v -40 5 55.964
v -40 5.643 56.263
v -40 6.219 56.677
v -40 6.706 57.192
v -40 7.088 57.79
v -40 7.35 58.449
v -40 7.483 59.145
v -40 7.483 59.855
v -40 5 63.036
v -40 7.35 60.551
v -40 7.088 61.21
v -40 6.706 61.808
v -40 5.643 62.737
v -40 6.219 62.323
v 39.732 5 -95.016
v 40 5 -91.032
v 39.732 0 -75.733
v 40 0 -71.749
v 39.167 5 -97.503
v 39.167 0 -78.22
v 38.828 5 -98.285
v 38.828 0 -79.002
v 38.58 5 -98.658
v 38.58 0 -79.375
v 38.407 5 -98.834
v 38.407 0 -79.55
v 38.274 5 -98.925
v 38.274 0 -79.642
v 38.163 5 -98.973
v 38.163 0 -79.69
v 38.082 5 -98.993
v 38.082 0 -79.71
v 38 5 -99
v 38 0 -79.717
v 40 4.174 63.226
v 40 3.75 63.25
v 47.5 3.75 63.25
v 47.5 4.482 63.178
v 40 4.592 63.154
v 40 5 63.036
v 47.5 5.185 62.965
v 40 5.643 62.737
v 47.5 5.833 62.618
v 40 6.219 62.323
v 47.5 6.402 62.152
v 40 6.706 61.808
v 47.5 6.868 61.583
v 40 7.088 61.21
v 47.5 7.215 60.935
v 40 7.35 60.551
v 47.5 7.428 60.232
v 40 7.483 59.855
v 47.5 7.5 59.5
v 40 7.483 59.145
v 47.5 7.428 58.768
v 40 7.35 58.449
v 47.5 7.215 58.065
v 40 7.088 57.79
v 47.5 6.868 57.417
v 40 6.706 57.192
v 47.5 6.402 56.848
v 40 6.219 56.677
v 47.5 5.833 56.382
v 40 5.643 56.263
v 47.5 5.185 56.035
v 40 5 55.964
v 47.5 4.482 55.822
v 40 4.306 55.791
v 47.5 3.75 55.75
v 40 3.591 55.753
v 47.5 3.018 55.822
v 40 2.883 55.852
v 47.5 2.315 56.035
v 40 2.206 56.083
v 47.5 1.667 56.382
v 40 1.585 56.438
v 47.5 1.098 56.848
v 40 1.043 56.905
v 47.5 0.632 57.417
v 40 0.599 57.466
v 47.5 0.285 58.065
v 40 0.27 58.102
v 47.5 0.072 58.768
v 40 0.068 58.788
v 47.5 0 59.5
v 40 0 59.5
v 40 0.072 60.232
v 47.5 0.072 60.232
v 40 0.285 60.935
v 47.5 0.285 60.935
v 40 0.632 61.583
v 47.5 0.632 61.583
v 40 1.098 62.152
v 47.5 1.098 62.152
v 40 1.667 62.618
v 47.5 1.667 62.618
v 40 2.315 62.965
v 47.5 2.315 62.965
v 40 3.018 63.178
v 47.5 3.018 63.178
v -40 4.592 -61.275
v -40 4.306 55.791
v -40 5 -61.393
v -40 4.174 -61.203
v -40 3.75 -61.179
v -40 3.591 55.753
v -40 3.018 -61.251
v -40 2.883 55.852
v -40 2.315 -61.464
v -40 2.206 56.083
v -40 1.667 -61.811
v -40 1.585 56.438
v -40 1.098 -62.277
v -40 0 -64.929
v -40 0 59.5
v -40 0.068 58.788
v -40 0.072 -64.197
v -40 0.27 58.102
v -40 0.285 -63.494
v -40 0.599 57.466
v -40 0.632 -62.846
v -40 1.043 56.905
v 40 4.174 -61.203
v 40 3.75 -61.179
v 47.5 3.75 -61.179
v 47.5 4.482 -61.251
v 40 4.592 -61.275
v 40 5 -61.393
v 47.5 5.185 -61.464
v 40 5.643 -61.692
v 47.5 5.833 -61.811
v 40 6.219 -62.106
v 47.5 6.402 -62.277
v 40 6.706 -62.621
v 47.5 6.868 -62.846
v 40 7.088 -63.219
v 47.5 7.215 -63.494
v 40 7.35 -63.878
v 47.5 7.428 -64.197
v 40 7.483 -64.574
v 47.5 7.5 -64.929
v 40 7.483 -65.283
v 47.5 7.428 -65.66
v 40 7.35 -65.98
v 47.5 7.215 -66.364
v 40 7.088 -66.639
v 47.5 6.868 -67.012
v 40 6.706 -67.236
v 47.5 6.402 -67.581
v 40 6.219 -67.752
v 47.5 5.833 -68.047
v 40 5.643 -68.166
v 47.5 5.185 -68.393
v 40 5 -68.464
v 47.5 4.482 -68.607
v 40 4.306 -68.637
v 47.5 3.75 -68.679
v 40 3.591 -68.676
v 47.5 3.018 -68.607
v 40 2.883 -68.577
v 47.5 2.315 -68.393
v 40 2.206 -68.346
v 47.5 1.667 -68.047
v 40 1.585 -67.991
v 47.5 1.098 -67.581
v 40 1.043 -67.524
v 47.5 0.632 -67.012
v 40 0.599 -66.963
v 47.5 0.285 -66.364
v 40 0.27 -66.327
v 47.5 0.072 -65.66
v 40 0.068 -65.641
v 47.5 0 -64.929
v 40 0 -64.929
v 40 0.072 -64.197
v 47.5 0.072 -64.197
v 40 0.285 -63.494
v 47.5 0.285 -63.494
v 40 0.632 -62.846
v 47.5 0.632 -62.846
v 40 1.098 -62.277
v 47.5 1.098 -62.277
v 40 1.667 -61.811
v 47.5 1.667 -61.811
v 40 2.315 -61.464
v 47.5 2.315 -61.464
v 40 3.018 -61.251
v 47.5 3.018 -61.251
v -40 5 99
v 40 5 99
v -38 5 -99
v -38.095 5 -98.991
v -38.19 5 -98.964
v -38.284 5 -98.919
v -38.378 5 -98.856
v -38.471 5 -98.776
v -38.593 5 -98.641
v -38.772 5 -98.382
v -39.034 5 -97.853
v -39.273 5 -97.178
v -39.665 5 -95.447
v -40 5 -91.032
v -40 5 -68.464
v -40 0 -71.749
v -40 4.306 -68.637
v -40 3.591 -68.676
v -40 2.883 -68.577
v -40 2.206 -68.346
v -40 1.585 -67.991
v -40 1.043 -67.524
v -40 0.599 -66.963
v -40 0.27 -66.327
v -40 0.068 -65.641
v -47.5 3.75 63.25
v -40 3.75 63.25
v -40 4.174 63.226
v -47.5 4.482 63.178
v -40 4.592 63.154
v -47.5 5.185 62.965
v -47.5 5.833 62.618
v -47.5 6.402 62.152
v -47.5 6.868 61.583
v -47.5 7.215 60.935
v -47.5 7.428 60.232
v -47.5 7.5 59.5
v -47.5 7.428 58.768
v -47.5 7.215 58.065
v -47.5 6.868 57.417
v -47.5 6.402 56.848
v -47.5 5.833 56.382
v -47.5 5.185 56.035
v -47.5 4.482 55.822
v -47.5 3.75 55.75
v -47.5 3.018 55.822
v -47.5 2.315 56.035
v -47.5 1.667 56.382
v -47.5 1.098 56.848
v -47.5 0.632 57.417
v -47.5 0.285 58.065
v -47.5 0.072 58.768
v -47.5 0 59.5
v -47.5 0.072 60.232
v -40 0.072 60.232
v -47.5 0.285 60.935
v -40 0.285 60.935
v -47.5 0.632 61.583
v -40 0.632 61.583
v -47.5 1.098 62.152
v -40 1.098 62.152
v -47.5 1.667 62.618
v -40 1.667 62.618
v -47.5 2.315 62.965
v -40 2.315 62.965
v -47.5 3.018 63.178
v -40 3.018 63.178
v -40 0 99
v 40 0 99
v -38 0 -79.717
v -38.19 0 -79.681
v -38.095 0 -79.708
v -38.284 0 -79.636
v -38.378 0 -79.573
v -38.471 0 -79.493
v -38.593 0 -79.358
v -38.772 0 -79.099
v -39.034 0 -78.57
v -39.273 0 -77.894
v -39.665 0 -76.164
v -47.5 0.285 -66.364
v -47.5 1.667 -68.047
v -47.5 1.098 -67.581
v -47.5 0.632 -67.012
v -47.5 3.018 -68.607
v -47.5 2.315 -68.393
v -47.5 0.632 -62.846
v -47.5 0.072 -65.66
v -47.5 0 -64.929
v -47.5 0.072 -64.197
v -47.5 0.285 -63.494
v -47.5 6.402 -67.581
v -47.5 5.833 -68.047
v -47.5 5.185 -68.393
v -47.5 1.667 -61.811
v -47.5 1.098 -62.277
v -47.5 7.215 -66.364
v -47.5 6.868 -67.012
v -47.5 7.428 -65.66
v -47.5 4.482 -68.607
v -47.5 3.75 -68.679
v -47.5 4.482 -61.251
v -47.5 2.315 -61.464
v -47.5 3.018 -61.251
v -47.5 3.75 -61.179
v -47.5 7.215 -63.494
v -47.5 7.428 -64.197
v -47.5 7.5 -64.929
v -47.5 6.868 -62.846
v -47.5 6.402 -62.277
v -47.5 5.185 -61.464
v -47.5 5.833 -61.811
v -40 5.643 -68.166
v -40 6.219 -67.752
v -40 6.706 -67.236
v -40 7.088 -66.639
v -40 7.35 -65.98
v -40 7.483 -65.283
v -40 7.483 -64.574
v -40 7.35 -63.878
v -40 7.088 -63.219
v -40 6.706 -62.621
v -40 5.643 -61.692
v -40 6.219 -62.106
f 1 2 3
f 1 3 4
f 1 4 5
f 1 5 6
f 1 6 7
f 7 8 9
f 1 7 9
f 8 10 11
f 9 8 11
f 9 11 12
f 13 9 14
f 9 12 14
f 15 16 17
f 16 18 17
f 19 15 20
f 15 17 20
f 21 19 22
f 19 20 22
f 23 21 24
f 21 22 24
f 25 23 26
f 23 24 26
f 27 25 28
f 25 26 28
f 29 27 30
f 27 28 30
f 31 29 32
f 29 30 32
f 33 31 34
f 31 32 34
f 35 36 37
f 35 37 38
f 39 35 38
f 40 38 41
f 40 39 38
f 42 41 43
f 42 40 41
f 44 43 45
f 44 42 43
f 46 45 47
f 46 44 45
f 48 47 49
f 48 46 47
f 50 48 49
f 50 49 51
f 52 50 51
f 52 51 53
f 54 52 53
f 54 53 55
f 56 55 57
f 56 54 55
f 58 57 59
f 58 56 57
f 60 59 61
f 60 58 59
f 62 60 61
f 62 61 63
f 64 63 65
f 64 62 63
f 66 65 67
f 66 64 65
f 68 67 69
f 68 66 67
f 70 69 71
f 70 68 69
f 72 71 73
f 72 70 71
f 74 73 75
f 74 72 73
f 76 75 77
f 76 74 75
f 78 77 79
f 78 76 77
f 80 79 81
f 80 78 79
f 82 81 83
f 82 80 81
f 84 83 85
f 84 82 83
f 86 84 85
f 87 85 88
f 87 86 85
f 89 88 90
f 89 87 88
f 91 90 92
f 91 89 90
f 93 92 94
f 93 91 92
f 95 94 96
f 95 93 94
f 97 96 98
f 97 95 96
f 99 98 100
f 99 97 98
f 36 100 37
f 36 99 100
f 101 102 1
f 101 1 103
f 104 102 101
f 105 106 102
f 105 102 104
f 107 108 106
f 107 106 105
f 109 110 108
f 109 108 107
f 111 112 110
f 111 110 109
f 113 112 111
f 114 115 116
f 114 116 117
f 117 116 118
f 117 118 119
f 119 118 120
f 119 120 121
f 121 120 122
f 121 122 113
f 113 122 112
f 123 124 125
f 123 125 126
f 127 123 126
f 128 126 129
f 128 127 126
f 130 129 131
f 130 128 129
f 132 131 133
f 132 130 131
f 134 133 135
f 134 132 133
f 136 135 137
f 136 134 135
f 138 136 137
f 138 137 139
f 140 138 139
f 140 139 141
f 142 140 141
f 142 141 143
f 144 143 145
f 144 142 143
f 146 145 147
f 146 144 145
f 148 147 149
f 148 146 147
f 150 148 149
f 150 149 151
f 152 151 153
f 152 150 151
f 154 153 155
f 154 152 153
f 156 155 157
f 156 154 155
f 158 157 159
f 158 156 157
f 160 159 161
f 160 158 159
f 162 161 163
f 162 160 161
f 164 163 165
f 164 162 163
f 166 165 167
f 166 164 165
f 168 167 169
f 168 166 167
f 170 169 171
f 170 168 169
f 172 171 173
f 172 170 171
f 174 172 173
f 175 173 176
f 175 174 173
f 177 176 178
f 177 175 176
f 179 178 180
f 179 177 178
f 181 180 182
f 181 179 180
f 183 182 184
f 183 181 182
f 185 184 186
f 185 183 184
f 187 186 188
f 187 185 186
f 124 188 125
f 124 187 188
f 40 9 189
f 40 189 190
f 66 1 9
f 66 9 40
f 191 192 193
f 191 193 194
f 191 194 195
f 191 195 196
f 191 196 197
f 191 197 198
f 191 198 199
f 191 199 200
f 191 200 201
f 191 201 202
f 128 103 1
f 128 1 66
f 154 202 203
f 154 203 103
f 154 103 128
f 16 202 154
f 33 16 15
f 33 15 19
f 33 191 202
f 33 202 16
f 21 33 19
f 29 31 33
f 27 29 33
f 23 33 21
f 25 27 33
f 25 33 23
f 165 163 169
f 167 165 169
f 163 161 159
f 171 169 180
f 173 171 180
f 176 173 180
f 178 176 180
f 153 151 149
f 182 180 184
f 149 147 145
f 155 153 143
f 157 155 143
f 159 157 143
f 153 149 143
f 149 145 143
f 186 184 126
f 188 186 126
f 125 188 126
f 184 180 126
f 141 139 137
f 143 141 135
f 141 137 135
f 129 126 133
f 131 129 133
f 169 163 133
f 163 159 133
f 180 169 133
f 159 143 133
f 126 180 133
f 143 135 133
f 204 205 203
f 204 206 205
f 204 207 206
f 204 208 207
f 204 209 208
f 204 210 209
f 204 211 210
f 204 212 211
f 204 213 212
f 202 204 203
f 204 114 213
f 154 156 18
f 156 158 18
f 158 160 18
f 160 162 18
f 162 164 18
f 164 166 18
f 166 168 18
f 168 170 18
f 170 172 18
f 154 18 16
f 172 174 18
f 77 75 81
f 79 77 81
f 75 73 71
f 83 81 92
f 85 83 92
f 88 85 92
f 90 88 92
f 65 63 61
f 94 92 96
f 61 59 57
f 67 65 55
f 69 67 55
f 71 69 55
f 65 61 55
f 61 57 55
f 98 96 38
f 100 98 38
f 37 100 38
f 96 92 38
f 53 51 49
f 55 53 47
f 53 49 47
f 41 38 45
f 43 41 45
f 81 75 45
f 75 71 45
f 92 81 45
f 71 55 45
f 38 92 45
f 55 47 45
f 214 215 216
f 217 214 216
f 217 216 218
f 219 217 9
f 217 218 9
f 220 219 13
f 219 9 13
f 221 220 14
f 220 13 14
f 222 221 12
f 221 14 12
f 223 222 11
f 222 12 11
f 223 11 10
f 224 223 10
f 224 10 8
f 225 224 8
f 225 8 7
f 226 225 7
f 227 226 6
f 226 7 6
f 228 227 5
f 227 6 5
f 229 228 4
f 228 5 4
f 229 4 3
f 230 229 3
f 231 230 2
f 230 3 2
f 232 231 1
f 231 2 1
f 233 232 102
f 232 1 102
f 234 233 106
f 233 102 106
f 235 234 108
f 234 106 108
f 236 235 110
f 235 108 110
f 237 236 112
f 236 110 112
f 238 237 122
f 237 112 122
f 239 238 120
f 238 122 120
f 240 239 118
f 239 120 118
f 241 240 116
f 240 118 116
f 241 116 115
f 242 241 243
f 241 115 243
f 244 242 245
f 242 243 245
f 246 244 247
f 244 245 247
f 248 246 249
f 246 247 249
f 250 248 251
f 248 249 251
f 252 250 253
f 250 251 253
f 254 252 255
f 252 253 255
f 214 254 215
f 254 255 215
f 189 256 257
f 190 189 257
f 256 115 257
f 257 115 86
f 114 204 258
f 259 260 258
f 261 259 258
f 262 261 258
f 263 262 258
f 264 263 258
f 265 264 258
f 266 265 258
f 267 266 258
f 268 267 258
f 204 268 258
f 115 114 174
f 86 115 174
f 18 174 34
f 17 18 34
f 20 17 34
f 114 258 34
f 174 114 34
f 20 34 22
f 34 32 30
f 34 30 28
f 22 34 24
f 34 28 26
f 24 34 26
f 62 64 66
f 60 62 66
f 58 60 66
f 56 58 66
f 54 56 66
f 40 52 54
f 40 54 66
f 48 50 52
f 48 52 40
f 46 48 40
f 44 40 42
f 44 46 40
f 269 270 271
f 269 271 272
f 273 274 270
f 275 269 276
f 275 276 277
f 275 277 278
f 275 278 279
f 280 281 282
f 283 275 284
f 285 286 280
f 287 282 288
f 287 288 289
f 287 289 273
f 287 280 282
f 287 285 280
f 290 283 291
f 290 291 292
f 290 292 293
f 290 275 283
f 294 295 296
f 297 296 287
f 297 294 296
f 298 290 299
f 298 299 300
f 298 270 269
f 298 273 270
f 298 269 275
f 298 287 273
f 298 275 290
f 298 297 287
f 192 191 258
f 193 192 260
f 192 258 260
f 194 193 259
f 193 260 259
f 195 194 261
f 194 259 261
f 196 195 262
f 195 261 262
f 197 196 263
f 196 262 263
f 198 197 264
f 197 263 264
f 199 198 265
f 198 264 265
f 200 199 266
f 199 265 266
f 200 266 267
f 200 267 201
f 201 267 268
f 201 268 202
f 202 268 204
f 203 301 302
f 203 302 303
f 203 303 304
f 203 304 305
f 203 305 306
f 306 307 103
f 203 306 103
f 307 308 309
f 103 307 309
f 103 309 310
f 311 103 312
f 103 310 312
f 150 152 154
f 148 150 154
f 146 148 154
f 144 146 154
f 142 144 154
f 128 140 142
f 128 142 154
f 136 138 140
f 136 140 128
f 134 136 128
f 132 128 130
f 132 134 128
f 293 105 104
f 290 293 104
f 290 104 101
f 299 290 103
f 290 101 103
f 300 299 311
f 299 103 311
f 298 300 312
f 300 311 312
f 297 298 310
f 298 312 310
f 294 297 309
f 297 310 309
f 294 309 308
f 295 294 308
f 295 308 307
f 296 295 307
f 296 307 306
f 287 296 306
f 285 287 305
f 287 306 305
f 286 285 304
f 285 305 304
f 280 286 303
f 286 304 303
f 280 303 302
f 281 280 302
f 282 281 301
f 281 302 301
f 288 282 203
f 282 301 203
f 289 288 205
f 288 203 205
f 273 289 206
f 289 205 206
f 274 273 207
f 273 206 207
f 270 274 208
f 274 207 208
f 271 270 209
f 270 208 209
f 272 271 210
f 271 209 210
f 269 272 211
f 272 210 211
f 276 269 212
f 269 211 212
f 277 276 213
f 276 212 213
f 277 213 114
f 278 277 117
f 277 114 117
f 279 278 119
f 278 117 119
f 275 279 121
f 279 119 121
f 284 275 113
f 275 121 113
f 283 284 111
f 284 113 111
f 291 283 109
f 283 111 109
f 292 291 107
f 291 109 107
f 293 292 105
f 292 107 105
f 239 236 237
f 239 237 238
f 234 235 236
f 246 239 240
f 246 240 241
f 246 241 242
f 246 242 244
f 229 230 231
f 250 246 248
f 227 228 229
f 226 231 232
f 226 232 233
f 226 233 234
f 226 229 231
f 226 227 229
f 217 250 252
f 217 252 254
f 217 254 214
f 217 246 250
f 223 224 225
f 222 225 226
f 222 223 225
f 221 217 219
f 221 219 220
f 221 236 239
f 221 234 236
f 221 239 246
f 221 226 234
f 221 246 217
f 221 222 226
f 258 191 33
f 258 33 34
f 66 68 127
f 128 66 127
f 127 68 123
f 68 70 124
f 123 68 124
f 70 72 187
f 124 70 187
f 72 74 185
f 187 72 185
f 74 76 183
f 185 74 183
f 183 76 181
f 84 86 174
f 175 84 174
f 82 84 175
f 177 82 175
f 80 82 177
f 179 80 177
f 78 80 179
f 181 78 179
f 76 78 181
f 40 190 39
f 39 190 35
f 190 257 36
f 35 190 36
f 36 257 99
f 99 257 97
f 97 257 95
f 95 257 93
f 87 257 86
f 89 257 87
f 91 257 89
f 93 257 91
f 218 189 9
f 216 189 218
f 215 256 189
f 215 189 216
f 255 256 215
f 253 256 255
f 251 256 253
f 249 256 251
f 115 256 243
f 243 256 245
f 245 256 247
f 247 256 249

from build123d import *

# Parameters (mm, degrees)
SKETCH1_W           = 80
SKETCH1_H           = 198
BOSS_EXTRUDE1_DEPTH = 5
SKETCH2_R           = 3.75
BOSS_EXTRUDE2_DEPTH = 7.5
CUT_EXTRUDE1_DEPTH  = 88.5
FILLET2_R           = 2


with BuildPart() as part:
    # Sketch1 → Boss-Extrude1 (new body)
    with BuildSketch(Plane(origin=(0, 0, 0), x_dir=(1, 0, 0), z_dir=(0, 1, 0))):
        Rectangle(SKETCH1_W, SKETCH1_H)
    extrude(amount=BOSS_EXTRUDE1_DEPTH)

    # Sketch2 → Boss-Extrude2 (add)
    with BuildSketch(Plane.ZY.offset(40)):
        with Locations((-64.928905814, 3.75)):
            Circle(SKETCH2_R)
        with Locations((59.5, 3.75)):
            Circle(SKETCH2_R)
    boss_extrude2 = extrude(amount=BOSS_EXTRUDE2_DEPTH)

    # Mirror1: Boss-Extrude2 across plane
    add(boss_extrude2.mirror(Plane(origin=(0, 0, 0), x_dir=(0, 0, 1), z_dir=(1, 0, 0))))

    # Sketch3 → Cut-Extrude1 (cut, through all)
    with BuildSketch(Plane.ZY.offset(40)):
        Polygon((-99, 5), (-72.932513489, -1.759148434), (-103.799311702, -1.759148434), align=None)
    extrude(amount=-CUT_EXTRUDE1_DEPTH, mode=Mode.SUBTRACT)

    # Fillet2
    fillet2_edges = [part.edges().sort_by_distance(p)[0] for p in [
        (40, 2.5, -89.358442796),
        (-40, 2.5, -89.358442796),
    ]]
    fillet(fillet2_edges, radius=FILLET2_R)


solid = part.part
